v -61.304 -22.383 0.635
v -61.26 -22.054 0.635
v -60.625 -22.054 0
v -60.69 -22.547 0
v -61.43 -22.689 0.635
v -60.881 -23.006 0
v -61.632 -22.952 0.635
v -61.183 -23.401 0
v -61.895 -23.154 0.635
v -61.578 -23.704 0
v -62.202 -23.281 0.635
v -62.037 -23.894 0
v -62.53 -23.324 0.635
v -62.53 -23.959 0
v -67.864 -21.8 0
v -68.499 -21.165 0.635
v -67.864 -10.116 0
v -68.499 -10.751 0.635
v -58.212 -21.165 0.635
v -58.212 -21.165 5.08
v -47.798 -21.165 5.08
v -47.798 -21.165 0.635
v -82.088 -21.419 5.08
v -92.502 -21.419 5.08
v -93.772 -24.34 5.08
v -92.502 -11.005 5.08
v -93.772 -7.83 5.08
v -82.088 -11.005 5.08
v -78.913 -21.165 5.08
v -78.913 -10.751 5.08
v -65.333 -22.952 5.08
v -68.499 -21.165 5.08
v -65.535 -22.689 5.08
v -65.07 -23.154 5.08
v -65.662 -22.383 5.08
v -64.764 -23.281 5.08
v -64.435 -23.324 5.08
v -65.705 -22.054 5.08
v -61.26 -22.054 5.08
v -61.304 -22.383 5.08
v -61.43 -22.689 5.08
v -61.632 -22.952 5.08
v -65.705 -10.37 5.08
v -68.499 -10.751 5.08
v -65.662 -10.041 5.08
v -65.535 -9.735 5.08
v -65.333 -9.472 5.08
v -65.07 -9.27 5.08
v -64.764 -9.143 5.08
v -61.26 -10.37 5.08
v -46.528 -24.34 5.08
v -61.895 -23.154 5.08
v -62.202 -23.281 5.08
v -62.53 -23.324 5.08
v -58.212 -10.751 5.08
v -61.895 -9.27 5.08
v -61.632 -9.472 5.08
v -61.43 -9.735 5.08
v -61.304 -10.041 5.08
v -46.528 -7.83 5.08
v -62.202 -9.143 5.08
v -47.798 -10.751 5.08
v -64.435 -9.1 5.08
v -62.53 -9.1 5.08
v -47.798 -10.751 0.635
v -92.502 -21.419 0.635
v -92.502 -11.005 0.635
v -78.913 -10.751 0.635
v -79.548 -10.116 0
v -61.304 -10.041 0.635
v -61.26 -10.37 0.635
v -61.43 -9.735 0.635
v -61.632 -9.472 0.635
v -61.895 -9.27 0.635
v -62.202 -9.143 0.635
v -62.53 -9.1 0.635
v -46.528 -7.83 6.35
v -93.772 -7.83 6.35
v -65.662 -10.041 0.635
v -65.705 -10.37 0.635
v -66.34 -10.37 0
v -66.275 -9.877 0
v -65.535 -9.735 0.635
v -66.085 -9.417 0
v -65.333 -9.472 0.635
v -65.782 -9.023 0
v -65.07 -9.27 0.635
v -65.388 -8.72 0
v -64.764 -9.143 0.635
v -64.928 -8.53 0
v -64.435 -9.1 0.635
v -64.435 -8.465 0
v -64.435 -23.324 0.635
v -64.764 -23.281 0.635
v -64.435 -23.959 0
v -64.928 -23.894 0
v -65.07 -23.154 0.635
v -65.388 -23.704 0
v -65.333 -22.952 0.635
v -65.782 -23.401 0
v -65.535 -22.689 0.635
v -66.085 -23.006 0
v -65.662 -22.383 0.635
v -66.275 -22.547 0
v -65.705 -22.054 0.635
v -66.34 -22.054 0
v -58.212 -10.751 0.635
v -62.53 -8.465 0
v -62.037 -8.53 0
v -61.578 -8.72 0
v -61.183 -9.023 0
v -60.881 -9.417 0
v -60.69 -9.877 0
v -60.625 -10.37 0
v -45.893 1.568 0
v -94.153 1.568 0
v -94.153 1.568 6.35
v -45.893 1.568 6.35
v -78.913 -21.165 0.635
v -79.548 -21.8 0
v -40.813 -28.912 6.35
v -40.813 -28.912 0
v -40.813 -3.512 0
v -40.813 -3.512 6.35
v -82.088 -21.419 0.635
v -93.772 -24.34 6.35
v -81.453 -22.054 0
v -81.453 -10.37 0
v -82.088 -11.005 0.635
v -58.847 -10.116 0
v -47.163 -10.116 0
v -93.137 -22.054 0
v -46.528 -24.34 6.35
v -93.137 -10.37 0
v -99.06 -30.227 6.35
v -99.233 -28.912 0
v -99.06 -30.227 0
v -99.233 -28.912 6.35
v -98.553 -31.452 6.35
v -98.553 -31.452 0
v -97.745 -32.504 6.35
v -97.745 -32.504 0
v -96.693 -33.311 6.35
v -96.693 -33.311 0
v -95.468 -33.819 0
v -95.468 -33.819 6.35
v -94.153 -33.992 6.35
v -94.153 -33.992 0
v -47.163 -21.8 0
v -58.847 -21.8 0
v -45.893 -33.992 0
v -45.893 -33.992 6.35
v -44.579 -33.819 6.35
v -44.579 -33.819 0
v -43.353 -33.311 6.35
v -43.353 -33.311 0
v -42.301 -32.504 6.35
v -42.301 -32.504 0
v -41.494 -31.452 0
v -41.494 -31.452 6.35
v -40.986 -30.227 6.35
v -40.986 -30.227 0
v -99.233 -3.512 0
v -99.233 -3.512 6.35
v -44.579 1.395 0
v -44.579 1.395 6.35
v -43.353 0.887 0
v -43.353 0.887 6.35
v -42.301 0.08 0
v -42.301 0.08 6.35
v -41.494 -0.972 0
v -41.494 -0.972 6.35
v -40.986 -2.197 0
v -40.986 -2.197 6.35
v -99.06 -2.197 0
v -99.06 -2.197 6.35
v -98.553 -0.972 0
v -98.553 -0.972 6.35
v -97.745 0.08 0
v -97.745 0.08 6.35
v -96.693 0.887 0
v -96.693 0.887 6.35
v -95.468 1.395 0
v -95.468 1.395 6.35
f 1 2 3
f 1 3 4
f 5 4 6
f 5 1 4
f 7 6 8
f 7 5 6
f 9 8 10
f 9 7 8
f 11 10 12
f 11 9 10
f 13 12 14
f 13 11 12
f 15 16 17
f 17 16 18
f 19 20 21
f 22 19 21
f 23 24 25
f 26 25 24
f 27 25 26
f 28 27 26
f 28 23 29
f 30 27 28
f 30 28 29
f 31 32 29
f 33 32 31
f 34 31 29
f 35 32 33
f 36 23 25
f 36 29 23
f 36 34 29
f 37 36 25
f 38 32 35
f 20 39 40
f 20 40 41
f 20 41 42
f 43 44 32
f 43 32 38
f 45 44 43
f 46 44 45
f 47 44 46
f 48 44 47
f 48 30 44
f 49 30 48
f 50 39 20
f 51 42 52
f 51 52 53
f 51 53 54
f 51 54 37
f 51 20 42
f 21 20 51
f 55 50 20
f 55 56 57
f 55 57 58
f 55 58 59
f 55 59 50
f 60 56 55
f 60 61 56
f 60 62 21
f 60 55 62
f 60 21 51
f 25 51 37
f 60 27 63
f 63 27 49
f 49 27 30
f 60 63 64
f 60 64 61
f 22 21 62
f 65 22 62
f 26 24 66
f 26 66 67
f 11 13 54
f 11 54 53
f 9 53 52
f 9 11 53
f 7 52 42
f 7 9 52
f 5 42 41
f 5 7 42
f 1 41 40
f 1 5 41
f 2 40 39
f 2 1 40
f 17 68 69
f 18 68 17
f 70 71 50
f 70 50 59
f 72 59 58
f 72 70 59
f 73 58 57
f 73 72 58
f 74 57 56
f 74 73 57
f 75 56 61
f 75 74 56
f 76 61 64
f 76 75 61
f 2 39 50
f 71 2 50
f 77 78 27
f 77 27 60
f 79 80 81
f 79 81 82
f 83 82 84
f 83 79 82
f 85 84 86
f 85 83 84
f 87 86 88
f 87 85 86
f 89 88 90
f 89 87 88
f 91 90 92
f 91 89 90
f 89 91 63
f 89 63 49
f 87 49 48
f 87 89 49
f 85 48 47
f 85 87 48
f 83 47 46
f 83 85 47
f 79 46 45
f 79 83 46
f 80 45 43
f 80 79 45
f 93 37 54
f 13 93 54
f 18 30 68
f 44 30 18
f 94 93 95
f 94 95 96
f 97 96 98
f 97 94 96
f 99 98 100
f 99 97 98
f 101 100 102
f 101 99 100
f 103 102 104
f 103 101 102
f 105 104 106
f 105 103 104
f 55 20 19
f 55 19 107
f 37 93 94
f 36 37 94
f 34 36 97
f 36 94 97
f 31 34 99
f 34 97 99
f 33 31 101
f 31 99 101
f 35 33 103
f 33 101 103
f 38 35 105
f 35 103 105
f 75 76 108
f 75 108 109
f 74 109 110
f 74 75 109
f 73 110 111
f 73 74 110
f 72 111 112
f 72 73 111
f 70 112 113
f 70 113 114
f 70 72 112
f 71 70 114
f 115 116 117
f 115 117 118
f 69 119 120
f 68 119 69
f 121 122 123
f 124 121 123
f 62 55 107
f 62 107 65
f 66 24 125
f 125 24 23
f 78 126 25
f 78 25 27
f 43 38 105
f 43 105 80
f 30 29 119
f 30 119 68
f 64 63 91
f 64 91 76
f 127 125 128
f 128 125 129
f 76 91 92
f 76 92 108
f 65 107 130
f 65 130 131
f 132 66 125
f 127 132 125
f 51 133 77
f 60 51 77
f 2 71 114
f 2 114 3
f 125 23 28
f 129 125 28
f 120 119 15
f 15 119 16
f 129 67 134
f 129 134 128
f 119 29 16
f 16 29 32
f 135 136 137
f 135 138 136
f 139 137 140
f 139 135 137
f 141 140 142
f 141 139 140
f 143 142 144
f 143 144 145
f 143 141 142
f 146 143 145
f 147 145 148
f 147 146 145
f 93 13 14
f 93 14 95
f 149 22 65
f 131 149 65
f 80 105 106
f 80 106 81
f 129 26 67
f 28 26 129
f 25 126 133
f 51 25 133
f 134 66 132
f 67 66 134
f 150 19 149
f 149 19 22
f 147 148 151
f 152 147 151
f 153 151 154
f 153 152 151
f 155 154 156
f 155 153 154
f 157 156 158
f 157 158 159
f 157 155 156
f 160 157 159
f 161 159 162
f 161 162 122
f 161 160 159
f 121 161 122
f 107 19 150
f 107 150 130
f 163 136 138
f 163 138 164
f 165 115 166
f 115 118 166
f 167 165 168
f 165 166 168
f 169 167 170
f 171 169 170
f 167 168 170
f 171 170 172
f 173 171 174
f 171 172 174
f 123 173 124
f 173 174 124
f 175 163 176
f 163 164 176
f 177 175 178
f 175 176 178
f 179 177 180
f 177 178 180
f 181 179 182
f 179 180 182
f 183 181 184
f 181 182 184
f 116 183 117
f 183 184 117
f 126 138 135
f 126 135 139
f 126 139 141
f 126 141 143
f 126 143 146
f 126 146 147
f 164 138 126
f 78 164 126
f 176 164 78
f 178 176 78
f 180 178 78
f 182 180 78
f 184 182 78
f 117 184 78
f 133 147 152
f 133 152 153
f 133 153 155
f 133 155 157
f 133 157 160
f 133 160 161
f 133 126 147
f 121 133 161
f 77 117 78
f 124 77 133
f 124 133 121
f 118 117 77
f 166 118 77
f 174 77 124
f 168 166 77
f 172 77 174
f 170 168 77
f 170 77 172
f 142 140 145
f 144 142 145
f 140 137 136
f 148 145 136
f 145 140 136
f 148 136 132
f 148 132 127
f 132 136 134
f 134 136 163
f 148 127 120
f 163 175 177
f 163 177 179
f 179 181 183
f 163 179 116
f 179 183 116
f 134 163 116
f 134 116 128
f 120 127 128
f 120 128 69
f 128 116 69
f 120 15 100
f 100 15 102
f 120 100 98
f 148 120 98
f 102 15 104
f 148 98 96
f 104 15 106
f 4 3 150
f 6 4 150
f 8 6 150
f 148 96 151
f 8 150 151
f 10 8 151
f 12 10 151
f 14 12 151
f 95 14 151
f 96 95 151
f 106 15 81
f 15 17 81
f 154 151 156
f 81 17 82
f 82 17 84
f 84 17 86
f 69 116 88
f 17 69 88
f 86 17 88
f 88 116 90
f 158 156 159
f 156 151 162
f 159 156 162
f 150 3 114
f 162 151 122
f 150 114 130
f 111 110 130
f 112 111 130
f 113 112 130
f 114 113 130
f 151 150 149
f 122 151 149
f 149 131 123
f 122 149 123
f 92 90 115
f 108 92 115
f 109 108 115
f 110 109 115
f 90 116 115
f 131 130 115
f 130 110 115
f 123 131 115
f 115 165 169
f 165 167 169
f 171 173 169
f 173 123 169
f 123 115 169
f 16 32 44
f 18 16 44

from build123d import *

# Parameters (mm, degrees)
F0_W     = 58.42
F0_H     = 35.56
F1_DEPTH = 6.35
F4_W     = 10.414
F4_H     = 10.414
F4_W_2   = 4.445
F4_H_2   = 14.224
F5_DEPTH = 25.4
F6_R     = 1.27
F3_W     = 47.244
F3_H     = 16.51
F7_DEPTH = 1.27
F8_R     = 5.08
F9_SIZE  = 0.635


with BuildPart() as f1:
    # F0 (on Top) → F1 (new body)
    with BuildSketch(Plane.XY):
        with Locations((-70.023337, -16.211975)):
            Rectangle(F0_W, F0_H)
    extrude(amount=F1_DEPTH)

    # F4 (on face) → F5 (cut)
    with BuildSketch(Plane.XY.offset(6.35)):
        with Locations((-87.295337, -16.211975)):
            Rectangle(F4_W, F4_H)
        with Locations((-73.706337, -15.957975)):
            Rectangle(F4_W, F4_H)
        with Locations((-53.005337, -15.957975)):
            Rectangle(F4_W, F4_H)
        with Locations((-63.482837, -16.211975)):
            Rectangle(F4_W_2, F4_H_2)
    extrude(amount=-F5_DEPTH, mode=Mode.SUBTRACT)

    # F6
    f6_edges = [f1.edges().sort_by_distance(p)[0] for p in [
        (-65.705337, -9.099975, 3.175),
        (-61.260337, -9.099975, 3.175),
        (-61.260337, -23.323975, 3.175),
        (-65.705337, -23.323975, 3.175),
    ]]
    fillet(f6_edges, radius=F6_R)

    # F3 (on face) → F7 (cut)
    with BuildSketch(Plane.XY.offset(6.35)):
        with Locations((-70.150337, -16.084975)):
            Rectangle(F3_W, F3_H)
    extrude(amount=-F7_DEPTH, mode=Mode.SUBTRACT)

    # F8
    f8_edges = [f1.edges().sort_by_distance(p)[0] for p in [
        (-40.813337, -33.991975, 3.175),
        (-40.813337, 1.568025, 3.175),
        (-99.233337, -33.991975, 3.175),
        (-99.233337, 1.568025, 3.175),
    ]]
    fillet(f8_edges, radius=F8_R)

    # F9
    f9_edges = [f1.edges().sort_by_distance(p)[0] for p in [
        (-87.295337, -21.418975, 0),
        (-87.295337, -11.004975, 0),
        (-82.088337, -16.211975, 0),
        (-92.502337, -16.211975, 0),
        (-73.706337, -21.164975, 0),
        (-78.913337, -15.957975, 0),
        (-73.706337, -10.750975, 0),
        (-68.499337, -15.957975, 0),
        (-65.705337, -16.211975, 0),
        (-58.212337, -15.957975, 0),
        (-53.005337, -21.164975, 0),
        (-47.798337, -15.957975, 0),
        (-53.005337, -10.750975, 0),
    ]]
    chamfer(f9_edges, length=F9_SIZE)


solid = f1.part
